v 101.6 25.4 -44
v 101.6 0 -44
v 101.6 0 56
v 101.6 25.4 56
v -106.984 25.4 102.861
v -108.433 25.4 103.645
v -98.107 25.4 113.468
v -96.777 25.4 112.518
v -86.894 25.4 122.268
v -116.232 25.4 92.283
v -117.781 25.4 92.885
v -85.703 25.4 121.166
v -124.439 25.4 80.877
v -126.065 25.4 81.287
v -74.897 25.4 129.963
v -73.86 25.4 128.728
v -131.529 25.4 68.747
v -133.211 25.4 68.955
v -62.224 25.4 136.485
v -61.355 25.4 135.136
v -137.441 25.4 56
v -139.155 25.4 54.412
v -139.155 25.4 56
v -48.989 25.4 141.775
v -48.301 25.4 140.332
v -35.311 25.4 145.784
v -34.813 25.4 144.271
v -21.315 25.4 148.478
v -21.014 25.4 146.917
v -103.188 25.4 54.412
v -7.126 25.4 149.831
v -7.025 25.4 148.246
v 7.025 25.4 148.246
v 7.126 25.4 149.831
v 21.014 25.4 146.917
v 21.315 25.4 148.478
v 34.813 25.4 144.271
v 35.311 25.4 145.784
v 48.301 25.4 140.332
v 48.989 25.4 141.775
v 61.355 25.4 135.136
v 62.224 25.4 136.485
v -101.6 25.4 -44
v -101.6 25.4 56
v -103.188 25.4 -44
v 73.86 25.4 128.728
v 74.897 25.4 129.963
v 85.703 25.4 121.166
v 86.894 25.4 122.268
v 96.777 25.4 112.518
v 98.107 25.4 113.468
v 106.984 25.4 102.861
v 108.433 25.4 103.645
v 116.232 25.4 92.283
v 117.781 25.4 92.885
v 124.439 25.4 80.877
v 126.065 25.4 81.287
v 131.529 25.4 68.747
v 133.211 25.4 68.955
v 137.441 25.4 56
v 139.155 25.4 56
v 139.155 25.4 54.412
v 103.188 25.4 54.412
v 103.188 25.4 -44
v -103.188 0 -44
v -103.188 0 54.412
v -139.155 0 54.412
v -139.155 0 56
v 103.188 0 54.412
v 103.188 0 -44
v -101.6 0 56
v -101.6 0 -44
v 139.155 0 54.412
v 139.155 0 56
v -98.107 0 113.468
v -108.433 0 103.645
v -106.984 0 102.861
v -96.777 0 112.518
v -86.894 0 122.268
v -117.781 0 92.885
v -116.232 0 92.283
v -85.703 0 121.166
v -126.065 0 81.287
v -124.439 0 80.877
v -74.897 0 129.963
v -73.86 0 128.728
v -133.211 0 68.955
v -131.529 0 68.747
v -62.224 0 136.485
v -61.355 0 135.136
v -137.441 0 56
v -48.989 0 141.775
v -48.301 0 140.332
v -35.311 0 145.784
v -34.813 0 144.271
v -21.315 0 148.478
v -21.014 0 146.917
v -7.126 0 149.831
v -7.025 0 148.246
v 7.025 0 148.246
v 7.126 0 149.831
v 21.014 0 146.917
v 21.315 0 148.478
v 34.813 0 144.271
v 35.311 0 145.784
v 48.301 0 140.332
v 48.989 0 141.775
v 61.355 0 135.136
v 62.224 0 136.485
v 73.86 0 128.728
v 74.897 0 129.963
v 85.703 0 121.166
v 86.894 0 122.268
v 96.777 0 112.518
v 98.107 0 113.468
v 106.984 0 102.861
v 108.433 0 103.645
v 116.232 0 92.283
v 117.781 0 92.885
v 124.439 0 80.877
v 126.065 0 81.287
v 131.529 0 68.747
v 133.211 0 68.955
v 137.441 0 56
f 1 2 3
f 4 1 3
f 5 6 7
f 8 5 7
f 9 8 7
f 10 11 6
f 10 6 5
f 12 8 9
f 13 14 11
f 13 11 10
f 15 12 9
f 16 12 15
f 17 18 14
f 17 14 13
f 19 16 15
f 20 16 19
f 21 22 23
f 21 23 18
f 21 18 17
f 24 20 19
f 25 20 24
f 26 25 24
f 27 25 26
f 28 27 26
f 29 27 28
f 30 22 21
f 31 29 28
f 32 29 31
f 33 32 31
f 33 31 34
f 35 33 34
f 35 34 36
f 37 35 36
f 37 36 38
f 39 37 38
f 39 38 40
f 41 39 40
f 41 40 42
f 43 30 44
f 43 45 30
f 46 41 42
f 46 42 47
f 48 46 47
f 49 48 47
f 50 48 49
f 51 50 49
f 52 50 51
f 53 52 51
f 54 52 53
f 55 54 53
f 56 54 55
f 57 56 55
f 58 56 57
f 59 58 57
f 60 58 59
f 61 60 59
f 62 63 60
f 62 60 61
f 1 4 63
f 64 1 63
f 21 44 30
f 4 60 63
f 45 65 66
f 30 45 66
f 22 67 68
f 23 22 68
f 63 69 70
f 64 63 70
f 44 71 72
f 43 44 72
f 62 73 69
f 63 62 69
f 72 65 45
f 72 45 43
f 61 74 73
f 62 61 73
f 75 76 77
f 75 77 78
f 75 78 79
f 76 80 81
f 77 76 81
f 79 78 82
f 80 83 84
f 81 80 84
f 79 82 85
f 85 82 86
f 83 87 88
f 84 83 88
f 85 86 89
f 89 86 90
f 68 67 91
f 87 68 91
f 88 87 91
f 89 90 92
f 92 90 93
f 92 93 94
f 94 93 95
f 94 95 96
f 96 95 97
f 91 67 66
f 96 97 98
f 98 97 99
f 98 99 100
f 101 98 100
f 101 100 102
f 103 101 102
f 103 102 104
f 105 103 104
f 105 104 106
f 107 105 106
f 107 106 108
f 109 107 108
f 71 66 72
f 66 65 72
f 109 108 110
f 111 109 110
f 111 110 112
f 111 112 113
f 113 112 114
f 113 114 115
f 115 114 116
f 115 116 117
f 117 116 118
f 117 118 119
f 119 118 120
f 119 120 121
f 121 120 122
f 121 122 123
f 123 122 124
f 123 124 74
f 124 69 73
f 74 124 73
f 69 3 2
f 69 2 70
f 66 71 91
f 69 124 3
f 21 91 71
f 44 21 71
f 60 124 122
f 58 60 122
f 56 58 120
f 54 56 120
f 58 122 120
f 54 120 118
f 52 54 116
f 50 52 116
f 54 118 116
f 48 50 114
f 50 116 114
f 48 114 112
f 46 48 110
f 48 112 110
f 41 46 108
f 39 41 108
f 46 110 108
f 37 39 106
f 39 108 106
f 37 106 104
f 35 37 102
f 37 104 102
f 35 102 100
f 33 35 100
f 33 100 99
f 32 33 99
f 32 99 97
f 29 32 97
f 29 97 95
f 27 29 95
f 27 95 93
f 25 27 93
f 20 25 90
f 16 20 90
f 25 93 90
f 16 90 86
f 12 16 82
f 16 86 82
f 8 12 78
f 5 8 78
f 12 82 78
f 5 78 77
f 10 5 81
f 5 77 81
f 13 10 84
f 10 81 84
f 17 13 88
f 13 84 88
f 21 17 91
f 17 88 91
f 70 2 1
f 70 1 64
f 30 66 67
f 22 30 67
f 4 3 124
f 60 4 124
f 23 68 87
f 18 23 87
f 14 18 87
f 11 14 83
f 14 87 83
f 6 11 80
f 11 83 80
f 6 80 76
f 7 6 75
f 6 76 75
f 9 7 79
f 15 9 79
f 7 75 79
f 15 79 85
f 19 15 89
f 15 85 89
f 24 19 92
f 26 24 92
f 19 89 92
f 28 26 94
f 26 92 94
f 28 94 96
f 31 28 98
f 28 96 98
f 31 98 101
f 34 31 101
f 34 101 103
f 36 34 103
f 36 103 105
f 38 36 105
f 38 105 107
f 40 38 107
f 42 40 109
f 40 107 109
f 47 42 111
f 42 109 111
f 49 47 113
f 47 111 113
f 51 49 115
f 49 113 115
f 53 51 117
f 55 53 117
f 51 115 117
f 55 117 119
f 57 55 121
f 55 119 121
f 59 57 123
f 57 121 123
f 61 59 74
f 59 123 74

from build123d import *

# Parameters (mm, degrees)
SKETCH1_W           = 1.588
SKETCH1_H           = 1.588
SKETCH1_H_2         = 98.412
SKETCH1_H_3         = 98.4125
SKETCH1_H_4         = 1.5875
BOSS_EXTRUDE1_DEPTH = 25.4


with BuildPart() as part:
    # Sketch1 → Boss-Extrude1 (new body)
    with BuildSketch(Plane(origin=(0, 0, 0), x_dir=(1, 0, 0), z_dir=(0, 1, 0))):
        with BuildLine():
            ThreePointArc((137.441339283, -56), (0, -148.412), (-137.441339283, -56))
            Line((-137.441339283, -56), (-139.154590294, -56))
            ThreePointArc((-139.154590294, -56), (0, -150), (139.154590294, -56))
            Line((139.154590294, -56), (137.441339283, -56))
        make_face()
        with BuildLine():
            Line((103.188, -54.412), (103.188, -56))
            Line((103.188, -56), (137.441339283, -56))
            ThreePointArc((137.441339283, -56), (137.761816422, -55.20691696), (138.077717246, -54.412))
            Line((138.077717246, -54.412), (103.188, -54.412))
        make_face()
        with Locations((102.394, -55.206)):
            Rectangle(SKETCH1_W, SKETCH1_H)
        with Locations((102.394, -5.206)):
            Rectangle(SKETCH1_W, SKETCH1_H_2)
        with Locations((-102.394, -5.20625)):
            Rectangle(SKETCH1_W, SKETCH1_H_3)
        with Locations((-102.394, -55.20625)):
            Rectangle(SKETCH1_W, SKETCH1_H_4)
        with BuildLine():
            Line((-137.441339283, -56), (-103.188, -56))
            Line((-103.188, -56), (-103.188, -54.4125))
            Line((-103.188, -54.4125), (-138.077520211, -54.4125))
            ThreePointArc((-138.077520211, -54.4125), (-137.761716465, -55.207166388), (-137.441339283, -56))
        make_face()
        with BuildLine():
            Line((-139.154590294, -56), (-137.441339283, -56))
            ThreePointArc((-137.441339283, -56), (-137.761716465, -55.207166388), (-138.077520211, -54.4125))
            Line((-138.077520211, -54.4125), (-139.154590294, -54.4125))
            Line((-139.154590294, -54.4125), (-139.154590294, -56))
        make_face()
        with BuildLine():
            ThreePointArc((138.077717246, -54.412), (137.761816422, -55.20691696), (137.441339283, -56))
            Line((137.441339283, -56), (139.154590294, -56))
            Line((139.154590294, -56), (139.154590294, -54.412))
            Line((139.154590294, -54.412), (138.077717246, -54.412))
        make_face()
    extrude(amount=BOSS_EXTRUDE1_DEPTH)


solid = part.part
